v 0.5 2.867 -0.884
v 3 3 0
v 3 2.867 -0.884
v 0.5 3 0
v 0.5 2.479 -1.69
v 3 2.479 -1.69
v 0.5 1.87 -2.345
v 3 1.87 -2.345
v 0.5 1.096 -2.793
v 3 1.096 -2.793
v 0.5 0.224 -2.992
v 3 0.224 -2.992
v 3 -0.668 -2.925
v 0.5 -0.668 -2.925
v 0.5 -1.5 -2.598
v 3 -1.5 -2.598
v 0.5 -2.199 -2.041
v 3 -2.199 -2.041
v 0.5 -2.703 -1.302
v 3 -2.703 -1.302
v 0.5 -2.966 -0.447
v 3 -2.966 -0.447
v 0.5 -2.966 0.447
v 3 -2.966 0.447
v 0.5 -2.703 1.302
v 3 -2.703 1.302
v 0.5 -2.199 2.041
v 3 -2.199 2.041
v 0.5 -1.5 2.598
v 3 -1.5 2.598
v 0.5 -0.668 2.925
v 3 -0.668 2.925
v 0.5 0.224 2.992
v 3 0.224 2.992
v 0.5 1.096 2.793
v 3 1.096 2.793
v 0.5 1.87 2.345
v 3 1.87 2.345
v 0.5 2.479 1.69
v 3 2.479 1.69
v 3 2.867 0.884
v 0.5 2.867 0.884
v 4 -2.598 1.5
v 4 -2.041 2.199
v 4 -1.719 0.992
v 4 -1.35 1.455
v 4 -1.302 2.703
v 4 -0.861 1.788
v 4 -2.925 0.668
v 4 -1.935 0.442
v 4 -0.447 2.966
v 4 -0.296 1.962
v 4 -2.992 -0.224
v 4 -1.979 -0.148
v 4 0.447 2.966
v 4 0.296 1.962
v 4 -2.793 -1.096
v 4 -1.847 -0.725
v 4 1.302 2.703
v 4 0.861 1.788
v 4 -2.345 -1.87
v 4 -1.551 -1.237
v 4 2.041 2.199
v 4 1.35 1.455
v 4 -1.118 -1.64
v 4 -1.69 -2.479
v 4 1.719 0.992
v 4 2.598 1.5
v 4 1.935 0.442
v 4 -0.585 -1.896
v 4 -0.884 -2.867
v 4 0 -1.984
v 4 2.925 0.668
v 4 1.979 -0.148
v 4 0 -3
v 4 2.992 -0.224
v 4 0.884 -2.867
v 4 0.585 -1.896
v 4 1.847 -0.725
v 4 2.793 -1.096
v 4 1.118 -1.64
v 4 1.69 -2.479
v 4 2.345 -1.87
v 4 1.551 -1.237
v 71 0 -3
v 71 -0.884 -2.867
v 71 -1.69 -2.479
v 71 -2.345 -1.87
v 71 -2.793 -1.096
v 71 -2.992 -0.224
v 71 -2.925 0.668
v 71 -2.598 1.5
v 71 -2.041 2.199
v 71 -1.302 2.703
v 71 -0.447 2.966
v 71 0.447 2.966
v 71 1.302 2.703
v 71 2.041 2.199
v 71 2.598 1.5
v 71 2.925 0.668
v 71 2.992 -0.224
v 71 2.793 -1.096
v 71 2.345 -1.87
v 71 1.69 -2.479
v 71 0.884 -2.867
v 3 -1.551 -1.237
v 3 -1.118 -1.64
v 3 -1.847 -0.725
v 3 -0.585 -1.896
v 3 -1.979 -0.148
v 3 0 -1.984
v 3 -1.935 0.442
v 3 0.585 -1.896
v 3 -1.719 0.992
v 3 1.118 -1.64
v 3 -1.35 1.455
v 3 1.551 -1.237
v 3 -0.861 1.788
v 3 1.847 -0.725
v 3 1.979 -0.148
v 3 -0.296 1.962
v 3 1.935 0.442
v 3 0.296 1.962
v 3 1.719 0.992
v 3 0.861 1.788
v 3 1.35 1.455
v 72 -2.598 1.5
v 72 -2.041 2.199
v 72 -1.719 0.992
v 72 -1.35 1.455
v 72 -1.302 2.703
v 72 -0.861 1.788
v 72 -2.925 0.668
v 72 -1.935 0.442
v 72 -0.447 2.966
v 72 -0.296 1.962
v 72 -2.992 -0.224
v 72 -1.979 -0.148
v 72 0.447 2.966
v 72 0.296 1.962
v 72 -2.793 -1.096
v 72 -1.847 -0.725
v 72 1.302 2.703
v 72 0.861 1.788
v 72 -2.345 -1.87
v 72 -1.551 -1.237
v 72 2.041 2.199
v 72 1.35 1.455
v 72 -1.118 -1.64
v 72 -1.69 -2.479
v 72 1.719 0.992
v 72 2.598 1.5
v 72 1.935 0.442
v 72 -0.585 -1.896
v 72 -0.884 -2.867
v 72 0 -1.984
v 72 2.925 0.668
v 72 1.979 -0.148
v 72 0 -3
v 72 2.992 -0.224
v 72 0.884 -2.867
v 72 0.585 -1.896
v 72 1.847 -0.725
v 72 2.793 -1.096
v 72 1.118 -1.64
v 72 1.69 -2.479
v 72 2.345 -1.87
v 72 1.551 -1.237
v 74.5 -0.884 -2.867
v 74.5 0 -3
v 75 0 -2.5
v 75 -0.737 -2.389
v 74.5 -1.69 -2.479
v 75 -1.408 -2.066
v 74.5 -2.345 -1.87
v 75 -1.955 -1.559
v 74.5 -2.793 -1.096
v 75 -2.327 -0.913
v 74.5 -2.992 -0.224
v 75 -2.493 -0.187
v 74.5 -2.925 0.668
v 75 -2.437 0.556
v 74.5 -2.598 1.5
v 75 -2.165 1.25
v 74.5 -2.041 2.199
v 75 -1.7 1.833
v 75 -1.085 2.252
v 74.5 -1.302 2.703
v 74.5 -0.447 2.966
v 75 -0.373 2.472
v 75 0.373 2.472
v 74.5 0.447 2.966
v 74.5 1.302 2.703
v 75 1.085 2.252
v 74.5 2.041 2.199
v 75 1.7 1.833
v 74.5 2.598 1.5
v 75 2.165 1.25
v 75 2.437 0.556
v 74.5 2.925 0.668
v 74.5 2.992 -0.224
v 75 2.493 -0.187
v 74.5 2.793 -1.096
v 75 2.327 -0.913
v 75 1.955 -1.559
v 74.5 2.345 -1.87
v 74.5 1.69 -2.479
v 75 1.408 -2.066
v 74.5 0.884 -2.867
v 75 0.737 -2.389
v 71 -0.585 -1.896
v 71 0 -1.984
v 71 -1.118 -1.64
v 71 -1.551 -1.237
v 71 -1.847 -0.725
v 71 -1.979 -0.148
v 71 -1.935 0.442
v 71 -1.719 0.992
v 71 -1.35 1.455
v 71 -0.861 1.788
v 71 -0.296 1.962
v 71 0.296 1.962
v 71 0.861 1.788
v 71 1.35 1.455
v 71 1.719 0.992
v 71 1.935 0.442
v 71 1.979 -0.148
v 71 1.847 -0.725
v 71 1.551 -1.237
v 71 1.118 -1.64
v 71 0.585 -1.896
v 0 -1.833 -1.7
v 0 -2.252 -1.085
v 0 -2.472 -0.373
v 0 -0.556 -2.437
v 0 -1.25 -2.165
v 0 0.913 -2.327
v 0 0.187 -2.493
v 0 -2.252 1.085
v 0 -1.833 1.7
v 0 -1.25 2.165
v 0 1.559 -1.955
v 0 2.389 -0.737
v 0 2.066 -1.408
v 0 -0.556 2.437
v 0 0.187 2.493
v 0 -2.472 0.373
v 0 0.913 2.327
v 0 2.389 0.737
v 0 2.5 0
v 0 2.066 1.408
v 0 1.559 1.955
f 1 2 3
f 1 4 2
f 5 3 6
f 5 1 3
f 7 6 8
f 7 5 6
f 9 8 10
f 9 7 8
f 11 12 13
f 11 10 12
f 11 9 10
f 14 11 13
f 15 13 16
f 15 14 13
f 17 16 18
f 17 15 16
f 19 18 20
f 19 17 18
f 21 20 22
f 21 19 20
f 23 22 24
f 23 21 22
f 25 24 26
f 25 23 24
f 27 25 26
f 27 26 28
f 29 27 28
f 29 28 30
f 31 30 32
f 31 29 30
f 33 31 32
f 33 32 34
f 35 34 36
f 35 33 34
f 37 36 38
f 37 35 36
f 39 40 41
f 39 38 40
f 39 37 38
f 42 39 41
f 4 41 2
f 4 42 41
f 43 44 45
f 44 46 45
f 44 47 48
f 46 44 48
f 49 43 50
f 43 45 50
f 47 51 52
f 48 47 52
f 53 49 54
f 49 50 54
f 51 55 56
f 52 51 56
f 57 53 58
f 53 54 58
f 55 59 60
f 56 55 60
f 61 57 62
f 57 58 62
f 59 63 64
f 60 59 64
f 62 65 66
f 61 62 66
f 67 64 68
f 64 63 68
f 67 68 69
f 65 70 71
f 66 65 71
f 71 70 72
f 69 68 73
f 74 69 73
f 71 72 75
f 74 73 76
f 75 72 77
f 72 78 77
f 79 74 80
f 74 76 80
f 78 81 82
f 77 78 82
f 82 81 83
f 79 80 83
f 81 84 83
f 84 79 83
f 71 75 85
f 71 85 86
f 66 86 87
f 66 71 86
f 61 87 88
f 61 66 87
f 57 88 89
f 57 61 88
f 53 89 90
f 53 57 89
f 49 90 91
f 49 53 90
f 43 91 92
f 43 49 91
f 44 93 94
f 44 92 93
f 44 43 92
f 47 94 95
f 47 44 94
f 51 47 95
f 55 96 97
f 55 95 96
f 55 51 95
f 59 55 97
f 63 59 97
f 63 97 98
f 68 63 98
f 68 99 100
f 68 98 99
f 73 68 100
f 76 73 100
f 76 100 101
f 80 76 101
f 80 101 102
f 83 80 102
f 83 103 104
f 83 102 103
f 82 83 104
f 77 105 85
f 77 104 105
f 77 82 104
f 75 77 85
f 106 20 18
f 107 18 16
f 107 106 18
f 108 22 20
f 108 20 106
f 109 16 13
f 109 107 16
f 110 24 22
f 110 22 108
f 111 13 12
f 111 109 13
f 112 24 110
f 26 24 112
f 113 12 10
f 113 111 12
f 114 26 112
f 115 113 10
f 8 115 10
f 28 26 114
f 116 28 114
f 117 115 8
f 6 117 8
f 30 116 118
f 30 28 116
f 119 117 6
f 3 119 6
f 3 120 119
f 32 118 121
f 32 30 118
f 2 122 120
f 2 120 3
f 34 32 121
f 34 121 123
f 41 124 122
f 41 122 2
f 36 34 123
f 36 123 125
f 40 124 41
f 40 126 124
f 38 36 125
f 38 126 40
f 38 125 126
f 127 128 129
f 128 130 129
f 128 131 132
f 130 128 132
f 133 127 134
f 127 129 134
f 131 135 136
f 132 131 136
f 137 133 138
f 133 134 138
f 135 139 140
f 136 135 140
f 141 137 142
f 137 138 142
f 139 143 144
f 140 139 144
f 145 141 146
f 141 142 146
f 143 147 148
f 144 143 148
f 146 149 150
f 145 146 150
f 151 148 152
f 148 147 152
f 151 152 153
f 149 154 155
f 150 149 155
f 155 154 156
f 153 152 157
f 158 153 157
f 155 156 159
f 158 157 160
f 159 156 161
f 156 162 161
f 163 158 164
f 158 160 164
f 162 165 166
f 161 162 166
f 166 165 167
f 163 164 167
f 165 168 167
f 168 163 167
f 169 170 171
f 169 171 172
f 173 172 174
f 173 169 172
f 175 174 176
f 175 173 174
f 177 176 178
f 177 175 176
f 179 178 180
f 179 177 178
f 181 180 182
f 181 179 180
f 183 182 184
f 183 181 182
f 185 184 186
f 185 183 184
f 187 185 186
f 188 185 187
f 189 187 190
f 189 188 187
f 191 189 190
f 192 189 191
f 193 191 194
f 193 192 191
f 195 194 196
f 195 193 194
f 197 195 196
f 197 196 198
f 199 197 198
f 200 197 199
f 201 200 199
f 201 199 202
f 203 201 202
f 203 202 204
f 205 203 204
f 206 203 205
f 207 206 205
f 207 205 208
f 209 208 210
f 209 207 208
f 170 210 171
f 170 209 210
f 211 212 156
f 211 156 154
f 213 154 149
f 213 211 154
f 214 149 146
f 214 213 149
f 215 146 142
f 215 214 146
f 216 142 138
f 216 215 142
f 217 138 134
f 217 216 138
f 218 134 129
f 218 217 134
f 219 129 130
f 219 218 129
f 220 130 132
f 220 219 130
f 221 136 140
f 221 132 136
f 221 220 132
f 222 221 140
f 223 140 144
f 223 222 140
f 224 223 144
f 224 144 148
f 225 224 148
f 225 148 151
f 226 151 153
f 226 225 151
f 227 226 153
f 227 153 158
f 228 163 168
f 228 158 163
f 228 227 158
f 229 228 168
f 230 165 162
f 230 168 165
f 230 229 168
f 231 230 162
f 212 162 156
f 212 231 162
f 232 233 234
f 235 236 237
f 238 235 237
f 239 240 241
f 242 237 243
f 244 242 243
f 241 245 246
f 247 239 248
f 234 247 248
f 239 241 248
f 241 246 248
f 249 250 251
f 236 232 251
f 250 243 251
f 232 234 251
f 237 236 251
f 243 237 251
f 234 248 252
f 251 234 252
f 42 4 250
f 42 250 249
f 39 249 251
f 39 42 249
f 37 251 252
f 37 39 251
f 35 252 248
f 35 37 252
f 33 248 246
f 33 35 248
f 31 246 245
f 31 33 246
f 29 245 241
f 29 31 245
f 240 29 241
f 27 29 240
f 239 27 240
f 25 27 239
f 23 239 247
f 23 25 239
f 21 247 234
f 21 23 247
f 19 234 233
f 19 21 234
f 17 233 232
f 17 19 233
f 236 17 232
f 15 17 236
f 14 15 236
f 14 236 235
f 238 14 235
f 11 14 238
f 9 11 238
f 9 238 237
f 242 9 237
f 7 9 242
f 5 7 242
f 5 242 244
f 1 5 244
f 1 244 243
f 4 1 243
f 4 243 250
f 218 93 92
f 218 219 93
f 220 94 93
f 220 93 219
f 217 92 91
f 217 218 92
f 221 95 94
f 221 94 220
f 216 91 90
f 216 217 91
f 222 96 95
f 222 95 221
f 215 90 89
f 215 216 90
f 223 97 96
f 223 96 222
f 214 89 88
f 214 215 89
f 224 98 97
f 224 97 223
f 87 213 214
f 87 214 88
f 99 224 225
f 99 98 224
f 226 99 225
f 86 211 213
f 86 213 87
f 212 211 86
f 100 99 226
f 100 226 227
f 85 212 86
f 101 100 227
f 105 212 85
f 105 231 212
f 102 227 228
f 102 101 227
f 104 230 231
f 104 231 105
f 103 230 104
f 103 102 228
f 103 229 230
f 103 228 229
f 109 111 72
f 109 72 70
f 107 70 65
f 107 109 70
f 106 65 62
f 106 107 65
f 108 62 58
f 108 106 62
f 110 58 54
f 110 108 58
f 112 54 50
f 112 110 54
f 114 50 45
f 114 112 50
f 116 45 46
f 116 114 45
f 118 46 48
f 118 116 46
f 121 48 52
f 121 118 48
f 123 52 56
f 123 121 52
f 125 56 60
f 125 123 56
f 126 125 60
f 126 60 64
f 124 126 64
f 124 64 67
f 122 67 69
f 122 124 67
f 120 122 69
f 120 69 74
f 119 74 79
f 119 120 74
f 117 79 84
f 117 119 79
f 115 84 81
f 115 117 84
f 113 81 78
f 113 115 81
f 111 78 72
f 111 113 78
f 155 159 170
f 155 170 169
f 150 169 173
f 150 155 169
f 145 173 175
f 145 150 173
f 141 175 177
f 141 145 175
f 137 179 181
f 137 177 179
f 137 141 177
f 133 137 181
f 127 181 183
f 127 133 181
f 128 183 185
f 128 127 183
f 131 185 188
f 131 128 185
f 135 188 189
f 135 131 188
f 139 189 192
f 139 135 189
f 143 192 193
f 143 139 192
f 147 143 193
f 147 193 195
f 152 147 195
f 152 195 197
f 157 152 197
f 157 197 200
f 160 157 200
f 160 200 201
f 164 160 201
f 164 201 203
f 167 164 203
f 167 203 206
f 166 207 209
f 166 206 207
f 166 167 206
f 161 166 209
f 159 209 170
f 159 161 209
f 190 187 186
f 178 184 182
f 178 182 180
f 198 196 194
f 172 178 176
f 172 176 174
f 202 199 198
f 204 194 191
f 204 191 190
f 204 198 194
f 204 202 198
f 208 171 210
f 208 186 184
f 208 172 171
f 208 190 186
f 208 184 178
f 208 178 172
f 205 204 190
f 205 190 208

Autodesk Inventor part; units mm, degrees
ref_plane "YZ Plane" through (0, 0, 0) normal (1, 0, 0) x (0, 1, 0)
ref_plane "XZ Plane" through (0, 0, 0) normal (0, 1, 0) x (-1, 0, 0)
ref_plane "XY Plane" through (0, 0, 0) normal (0, 0, 1) x (1, 0, 0)
sketch "Esboço2" plane through (0, 0, 0) normal (1, 0, 0) x (0, 1, 0)
  circle A0 centre (0, 0) radius 3
  dimension "d0" = 6
extrude "Extrusão1" add sketch "Esboço2" along normal blind 3
sketch "Esboço3" plane through (3, 0, 0) normal (1, 0, 0) x (0, 0, -1)
  circle A0 centre (0, 0) radius 3 projected
  circle A1 centre (0, 0) radius 1.9844
  dimension "d3" = 3.9688
extrude "Extrusão2" add sketch "Esboço3" along normal blind 1 contours A1
sketch "Esboço4" plane through (4, 0, 0) normal (1, 0, 0) x (0, 0, -1)
  circle A0 centre (0, 0) radius 1.9844 projected
  circle A1 centre (0, 0) radius 3
  dimension "d6" = 6
extrude "Extrusão3" add sketch "Esboço4" along normal blind 67 contours A0 | A1
sketch "Esboço5" plane through (71, 0, 0) normal (1, 0, 0) x (0, 0, -1)
  circle A0 centre (0, 0) radius 3 projected
  circle A1 centre (0, 0) radius 1.9844
  dimension "d9" = 3.9688
extrude "Extrusão4" add sketch "Esboço5" along normal blind 1 contours A1
sketch "Esboço6" plane through (72, 0, 0) normal (1, 0, 0) x (0, 0, -1)
  circle A0 centre (0, 0) radius 1.9844 projected
  circle A1 centre (0, 0) radius 3
  dimension "d12" = 6
extrude "Extrusão5" add sketch "Esboço6" along normal blind 3 contours A0 | A1
chamfer "Chanfro1" distance 0.5 angle 45 2 edges at (0, -3, 0) (75, 0, 3)
properties part number "pino_a3" material "Aço carbono"
